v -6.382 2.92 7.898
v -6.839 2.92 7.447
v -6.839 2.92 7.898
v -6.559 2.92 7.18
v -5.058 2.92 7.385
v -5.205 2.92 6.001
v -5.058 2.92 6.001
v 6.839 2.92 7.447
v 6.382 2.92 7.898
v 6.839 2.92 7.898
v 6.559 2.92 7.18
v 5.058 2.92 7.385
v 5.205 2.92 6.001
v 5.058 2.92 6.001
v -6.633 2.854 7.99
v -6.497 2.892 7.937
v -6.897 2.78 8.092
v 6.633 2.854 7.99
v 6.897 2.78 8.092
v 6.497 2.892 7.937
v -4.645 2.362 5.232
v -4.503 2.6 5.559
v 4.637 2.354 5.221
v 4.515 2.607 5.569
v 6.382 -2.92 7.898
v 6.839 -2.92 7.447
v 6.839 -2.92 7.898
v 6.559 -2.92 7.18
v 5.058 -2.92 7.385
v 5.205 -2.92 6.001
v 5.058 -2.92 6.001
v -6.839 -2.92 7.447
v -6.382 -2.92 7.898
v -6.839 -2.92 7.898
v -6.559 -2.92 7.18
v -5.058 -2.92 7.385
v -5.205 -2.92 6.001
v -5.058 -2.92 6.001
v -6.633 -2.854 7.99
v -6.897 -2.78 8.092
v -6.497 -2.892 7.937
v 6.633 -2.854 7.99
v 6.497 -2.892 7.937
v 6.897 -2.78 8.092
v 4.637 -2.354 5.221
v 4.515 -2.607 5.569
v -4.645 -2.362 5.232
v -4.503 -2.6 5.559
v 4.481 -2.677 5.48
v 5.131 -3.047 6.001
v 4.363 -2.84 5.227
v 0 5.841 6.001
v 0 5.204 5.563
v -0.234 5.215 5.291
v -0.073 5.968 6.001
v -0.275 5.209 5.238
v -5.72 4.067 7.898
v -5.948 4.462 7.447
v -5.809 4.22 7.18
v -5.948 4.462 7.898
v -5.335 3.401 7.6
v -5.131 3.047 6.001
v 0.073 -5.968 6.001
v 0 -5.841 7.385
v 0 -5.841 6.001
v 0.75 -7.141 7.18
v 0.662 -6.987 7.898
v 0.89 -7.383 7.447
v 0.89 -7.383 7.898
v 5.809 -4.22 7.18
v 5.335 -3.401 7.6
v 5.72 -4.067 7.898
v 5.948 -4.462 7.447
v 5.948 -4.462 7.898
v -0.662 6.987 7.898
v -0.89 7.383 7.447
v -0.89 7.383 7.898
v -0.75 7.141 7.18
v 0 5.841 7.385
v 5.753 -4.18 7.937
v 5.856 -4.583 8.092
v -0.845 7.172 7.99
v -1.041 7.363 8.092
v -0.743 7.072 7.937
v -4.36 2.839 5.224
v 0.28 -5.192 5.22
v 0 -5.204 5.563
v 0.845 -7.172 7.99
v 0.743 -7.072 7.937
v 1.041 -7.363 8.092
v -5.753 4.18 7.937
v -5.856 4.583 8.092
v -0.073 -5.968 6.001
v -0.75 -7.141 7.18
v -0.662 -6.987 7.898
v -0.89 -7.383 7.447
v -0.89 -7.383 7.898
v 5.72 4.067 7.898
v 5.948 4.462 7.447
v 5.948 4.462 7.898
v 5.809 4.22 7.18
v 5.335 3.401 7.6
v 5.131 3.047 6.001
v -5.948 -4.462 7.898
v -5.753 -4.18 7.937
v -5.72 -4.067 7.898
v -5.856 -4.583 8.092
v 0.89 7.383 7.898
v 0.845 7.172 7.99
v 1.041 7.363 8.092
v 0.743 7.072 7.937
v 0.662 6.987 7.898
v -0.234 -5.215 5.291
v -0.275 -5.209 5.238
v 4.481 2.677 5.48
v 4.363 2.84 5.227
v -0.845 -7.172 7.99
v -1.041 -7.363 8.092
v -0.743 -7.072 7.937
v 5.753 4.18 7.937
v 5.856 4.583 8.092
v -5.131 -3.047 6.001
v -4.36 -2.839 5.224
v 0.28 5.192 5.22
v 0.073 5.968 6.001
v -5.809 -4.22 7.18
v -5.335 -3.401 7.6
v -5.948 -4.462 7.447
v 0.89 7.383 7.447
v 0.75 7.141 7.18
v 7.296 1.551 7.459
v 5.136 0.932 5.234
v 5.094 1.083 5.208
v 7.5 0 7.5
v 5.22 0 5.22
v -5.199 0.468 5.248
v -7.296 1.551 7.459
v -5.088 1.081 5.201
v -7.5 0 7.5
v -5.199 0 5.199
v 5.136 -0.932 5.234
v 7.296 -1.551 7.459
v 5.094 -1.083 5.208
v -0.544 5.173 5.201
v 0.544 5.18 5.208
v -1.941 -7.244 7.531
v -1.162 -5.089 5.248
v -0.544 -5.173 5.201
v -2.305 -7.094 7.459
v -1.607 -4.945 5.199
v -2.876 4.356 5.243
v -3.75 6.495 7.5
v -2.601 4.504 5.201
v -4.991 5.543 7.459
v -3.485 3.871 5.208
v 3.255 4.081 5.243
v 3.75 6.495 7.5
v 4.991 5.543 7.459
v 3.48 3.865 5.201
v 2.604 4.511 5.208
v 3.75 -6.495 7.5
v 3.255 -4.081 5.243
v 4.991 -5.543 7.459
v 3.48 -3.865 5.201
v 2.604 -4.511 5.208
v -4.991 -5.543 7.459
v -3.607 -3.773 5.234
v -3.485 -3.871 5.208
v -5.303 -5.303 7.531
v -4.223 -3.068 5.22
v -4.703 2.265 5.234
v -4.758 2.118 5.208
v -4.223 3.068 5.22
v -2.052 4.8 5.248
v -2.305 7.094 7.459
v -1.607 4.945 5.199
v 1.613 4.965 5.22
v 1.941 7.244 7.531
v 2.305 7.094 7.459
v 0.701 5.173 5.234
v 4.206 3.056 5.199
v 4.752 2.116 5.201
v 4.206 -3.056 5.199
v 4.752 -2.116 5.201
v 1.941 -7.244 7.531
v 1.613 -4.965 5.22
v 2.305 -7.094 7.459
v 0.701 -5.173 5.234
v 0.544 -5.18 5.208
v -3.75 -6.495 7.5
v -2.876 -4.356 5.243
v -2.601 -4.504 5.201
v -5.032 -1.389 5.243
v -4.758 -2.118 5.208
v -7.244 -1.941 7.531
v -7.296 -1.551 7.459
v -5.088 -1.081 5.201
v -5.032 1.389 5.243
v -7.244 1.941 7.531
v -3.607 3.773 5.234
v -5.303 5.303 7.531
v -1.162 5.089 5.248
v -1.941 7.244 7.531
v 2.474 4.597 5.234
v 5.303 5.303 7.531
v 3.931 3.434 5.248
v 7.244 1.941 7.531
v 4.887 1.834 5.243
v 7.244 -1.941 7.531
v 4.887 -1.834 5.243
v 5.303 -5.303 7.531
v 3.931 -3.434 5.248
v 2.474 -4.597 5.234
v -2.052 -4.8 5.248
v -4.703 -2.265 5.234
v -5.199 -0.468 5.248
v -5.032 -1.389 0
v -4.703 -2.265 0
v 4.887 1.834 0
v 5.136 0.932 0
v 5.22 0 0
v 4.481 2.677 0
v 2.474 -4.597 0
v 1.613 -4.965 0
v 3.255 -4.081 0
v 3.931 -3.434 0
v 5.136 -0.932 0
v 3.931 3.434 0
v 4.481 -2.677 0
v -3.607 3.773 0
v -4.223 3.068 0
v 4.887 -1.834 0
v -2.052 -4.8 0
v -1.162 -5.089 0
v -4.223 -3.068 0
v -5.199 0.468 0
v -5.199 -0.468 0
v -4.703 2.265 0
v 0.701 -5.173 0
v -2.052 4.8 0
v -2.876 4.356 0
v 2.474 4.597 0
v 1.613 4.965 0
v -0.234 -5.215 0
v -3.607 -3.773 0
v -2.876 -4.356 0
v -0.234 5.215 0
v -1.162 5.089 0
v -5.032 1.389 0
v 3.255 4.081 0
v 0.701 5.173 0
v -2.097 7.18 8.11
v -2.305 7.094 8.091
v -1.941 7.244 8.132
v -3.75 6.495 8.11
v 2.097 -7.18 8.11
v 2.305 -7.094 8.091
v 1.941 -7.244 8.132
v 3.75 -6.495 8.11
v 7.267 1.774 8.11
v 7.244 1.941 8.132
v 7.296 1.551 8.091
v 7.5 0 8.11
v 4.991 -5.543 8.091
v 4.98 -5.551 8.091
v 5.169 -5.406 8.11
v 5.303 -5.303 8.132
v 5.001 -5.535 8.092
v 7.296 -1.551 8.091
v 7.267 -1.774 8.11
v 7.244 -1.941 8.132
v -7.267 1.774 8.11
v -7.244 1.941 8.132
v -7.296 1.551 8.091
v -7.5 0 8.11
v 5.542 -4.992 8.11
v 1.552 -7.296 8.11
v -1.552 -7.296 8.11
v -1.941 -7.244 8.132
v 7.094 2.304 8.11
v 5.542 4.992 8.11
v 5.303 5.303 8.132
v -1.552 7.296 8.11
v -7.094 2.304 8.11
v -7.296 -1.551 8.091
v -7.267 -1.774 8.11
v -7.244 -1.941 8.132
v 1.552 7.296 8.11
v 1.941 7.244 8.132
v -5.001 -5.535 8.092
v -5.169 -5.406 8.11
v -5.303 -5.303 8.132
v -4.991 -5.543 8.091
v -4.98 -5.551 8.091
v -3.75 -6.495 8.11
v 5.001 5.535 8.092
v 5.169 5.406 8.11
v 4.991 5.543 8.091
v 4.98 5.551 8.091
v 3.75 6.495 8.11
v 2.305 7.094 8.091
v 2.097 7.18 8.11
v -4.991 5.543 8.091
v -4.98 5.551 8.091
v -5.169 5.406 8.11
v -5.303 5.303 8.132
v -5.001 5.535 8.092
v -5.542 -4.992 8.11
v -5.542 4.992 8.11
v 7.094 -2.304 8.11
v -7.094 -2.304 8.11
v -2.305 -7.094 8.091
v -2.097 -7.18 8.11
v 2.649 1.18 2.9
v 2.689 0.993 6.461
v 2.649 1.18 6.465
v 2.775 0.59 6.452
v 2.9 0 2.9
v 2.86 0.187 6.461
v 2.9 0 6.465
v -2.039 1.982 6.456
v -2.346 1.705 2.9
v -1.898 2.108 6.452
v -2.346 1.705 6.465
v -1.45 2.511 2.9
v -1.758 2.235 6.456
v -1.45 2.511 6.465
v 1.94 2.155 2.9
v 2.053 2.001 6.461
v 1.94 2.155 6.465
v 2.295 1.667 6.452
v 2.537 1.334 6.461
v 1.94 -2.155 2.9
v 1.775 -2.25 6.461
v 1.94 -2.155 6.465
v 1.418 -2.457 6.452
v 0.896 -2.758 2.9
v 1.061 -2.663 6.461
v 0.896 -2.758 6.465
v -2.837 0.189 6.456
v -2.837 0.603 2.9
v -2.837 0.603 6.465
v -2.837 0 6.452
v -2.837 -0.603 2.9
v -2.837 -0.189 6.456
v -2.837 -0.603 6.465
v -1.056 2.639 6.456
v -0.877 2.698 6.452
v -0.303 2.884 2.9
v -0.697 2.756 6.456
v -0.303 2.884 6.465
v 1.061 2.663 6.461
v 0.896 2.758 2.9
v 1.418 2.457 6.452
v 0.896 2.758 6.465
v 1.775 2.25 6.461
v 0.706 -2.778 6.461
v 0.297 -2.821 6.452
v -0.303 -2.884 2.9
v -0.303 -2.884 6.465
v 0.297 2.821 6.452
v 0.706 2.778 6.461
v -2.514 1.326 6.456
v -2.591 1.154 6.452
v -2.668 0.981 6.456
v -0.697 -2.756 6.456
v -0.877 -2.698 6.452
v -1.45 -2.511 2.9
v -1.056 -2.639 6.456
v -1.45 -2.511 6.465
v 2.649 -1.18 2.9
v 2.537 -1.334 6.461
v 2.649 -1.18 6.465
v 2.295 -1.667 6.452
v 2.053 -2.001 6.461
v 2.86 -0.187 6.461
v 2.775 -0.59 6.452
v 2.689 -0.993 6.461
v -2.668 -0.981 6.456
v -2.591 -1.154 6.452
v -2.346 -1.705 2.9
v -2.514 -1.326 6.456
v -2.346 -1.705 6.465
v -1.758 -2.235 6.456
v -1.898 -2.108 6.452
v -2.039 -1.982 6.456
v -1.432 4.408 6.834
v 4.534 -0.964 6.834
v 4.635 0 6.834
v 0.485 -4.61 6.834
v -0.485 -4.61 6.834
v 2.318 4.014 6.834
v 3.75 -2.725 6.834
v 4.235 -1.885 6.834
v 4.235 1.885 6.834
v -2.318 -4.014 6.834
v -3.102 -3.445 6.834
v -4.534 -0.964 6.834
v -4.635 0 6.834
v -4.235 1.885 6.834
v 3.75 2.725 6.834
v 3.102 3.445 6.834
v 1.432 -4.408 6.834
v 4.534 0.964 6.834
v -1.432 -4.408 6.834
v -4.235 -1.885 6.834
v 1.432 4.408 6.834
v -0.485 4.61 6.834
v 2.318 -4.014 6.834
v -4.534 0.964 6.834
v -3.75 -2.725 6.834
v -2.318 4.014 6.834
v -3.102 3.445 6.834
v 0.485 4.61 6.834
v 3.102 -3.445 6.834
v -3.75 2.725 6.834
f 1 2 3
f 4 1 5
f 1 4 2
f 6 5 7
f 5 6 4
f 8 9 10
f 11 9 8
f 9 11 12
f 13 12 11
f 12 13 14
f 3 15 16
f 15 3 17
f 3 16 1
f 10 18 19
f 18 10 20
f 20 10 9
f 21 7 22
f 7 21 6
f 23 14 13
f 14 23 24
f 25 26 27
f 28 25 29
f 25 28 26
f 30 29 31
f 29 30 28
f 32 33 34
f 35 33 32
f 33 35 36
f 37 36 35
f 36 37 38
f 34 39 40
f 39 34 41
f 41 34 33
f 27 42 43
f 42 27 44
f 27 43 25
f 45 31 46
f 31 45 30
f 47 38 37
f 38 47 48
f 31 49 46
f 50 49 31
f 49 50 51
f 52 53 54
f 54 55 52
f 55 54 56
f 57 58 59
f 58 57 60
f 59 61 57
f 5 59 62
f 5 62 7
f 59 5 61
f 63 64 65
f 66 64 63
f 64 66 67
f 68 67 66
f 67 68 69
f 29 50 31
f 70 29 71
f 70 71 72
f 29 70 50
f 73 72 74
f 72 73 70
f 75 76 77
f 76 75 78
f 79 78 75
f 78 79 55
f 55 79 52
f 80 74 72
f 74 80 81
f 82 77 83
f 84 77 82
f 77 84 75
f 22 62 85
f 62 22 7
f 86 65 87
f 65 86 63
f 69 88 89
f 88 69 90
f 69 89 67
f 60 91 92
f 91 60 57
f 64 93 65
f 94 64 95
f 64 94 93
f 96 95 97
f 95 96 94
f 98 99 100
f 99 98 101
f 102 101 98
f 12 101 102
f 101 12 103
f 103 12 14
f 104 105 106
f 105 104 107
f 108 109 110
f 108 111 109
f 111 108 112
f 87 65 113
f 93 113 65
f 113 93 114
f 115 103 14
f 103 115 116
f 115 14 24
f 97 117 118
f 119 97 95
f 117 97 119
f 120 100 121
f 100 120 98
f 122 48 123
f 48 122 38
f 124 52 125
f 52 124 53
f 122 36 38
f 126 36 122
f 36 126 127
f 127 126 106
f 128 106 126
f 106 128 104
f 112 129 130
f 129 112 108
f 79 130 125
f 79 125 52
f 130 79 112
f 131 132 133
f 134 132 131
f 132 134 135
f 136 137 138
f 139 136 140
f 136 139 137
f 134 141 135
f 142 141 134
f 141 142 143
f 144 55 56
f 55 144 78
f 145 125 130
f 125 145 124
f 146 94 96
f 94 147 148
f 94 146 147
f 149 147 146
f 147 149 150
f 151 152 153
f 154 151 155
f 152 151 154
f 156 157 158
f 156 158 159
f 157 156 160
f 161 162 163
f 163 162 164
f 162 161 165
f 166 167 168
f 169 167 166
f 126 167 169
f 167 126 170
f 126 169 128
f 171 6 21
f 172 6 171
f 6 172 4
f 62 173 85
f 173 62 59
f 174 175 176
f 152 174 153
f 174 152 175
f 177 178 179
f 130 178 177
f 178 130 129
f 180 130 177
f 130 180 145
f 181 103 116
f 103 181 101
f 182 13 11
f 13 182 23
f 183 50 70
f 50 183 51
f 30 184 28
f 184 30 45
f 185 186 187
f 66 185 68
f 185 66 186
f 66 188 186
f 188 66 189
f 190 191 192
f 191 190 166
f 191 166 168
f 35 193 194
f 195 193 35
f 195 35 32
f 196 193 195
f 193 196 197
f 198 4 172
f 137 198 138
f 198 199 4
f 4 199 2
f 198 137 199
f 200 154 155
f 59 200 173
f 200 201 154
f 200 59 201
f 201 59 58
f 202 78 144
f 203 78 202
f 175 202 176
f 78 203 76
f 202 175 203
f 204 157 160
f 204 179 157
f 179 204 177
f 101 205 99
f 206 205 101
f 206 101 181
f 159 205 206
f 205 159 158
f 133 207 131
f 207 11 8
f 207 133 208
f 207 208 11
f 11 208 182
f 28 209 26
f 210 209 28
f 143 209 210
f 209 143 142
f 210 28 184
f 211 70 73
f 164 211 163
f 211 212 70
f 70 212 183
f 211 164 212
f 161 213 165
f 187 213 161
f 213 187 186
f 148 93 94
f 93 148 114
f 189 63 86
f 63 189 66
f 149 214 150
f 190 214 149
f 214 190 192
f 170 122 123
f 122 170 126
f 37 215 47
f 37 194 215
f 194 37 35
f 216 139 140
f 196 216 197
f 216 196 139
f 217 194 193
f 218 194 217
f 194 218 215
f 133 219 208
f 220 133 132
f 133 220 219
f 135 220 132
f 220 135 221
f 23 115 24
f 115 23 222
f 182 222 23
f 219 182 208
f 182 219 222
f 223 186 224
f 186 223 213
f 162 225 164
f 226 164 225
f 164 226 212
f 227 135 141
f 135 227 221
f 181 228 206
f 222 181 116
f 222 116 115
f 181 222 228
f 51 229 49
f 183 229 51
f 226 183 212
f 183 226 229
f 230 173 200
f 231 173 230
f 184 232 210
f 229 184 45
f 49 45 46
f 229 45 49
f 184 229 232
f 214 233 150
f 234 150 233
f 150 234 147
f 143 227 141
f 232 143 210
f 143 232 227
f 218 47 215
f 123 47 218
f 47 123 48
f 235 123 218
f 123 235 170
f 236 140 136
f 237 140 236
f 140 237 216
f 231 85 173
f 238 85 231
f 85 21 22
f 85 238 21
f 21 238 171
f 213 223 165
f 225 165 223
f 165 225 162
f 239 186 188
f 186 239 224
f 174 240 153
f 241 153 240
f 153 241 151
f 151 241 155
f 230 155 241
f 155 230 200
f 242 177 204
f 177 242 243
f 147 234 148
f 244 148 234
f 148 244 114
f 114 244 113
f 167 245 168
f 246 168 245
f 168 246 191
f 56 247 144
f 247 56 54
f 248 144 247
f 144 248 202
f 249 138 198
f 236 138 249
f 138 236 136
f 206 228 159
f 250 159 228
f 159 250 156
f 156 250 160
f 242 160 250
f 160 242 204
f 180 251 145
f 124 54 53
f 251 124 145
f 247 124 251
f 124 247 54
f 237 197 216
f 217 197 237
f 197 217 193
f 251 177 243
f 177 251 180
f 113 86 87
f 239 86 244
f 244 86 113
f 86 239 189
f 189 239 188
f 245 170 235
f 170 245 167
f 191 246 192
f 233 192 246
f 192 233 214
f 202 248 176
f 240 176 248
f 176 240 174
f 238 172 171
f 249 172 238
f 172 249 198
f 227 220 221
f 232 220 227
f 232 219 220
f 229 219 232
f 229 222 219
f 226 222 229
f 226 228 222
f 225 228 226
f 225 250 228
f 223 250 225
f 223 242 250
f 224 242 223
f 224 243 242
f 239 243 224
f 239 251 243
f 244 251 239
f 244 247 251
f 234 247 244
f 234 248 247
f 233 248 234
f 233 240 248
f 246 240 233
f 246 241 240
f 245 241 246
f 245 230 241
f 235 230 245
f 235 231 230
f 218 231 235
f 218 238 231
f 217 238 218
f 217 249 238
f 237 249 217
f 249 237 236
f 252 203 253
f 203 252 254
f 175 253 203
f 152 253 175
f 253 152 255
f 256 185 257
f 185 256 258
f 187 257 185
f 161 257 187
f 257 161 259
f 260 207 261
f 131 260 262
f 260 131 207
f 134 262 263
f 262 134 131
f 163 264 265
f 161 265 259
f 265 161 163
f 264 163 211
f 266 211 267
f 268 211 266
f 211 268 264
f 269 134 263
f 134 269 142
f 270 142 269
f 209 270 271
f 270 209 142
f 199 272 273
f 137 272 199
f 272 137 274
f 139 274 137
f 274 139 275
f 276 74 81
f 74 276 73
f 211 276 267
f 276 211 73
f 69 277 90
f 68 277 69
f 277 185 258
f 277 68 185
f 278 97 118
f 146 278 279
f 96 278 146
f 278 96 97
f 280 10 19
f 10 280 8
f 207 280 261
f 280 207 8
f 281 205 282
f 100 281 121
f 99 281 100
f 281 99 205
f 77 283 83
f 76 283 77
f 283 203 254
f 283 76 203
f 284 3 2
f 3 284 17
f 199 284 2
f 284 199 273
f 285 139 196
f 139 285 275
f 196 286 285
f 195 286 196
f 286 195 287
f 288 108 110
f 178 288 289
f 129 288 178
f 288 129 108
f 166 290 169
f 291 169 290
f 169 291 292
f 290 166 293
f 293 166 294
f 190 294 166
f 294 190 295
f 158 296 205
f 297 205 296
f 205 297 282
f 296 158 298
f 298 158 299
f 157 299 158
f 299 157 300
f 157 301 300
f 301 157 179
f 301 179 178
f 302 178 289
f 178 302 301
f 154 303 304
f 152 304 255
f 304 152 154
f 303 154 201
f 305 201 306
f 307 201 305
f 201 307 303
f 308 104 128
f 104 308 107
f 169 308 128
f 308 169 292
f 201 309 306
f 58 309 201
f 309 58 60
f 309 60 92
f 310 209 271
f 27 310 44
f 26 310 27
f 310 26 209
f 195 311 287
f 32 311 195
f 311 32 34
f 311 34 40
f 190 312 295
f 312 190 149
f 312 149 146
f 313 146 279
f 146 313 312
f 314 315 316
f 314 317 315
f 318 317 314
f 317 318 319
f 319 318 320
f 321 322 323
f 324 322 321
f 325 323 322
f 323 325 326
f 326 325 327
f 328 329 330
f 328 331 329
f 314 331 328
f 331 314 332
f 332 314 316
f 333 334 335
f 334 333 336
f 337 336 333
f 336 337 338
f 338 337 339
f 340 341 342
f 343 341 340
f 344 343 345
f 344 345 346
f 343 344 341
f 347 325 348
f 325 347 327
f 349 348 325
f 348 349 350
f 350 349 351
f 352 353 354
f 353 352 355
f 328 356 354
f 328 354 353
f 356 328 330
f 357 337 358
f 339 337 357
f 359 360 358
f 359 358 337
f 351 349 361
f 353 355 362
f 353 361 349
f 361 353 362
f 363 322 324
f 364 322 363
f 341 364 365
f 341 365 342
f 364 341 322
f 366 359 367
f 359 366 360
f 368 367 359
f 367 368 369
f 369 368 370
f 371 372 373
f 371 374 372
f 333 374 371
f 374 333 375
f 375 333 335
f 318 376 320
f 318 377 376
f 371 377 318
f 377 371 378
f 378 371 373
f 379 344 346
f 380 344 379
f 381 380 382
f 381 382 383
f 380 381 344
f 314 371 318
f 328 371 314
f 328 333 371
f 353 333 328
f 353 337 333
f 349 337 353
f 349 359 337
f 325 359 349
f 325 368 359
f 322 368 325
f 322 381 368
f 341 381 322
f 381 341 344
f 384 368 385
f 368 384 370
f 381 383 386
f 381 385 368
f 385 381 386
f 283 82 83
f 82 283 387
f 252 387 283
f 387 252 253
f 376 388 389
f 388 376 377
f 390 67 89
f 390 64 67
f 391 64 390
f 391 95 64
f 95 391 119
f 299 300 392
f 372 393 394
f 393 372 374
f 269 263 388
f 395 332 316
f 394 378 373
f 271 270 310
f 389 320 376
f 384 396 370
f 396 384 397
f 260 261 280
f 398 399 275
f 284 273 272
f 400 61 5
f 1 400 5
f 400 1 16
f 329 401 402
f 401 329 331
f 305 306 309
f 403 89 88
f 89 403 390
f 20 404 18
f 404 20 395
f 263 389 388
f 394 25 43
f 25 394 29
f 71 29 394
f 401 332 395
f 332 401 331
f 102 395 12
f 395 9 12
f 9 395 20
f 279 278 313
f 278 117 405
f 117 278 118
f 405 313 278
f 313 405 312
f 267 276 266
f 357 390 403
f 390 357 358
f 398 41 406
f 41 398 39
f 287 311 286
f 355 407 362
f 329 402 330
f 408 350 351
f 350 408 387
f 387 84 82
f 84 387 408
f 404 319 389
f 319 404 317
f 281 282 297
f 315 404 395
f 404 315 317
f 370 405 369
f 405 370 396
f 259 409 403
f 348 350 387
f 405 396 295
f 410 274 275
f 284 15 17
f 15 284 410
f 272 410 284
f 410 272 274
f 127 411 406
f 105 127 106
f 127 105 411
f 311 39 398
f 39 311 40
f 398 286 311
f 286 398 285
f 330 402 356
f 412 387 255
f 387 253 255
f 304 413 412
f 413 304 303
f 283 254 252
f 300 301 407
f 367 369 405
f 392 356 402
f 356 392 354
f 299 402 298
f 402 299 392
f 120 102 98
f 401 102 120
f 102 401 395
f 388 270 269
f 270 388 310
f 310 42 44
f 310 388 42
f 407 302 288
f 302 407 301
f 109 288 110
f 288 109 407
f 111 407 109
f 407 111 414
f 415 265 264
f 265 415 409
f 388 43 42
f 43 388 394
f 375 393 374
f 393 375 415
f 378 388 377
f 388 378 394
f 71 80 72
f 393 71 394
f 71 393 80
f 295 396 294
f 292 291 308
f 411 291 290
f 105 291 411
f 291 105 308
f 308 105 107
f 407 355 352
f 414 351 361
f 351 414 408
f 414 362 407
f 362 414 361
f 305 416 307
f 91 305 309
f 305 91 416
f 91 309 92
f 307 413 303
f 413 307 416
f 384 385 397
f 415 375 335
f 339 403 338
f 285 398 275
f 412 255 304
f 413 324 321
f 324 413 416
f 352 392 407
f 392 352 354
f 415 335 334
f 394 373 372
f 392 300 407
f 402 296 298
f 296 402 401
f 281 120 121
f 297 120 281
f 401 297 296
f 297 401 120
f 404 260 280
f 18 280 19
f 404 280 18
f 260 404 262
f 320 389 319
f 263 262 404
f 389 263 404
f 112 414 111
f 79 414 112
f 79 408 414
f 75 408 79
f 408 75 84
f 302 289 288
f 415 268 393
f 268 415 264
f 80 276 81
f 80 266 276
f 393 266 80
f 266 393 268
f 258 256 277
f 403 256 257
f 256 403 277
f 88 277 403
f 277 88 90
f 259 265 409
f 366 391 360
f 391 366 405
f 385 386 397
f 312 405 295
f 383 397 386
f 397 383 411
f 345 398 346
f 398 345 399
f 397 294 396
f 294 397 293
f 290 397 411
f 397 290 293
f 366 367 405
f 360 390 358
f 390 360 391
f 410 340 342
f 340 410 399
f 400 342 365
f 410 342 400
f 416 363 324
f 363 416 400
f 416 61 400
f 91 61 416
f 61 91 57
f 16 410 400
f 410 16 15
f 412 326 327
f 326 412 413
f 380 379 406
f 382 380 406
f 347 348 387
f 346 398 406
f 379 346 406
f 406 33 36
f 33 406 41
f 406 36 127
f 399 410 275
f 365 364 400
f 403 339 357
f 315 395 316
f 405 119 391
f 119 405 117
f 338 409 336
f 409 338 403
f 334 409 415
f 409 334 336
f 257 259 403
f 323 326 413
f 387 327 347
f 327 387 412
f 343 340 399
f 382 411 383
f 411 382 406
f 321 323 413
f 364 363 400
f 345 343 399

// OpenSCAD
// Birthday candle holder by teejaydub

// preview[view:north, tilt:top]
/* [Global] */

// The diameter of the birthday candle [mm]
CANDLE_DIAMETER = 5.8;  //first try: 5.3, too small; 5.5 - 5.7, works but tight

// The outer diameter of the candle holder [mm]
OUTER_DIAMETER = 15;

/* [Hidden] */

CANDLE_RADIUS = CANDLE_DIAMETER / 2;
OUTER_RADIUS = OUTER_DIAMETER / 2;

HOLE_HEIGHT = CANDLE_RADIUS * 5;  // of the cutting hole object
CANDLE_HEIGHT = CANDLE_RADIUS;  // height of the candle above the floor
CANDLE_DEPTH = CANDLE_RADIUS * 1;  // how much the candle is buried in the holder

BASE_HEIGHT = CANDLE_HEIGHT + CANDLE_DEPTH;  // of the base object
BASE_RADIUS = CANDLE_RADIUS * 1.8;

PETAL_RADIUS = BASE_RADIUS / 1.7;

BOWL_RADIUS = OUTER_DIAMETER;

difference() {
	intersection() {
		union() {
			// Base
			translate([0, 0, BASE_HEIGHT / 2])
				cylinder(h = BASE_HEIGHT, r = BASE_RADIUS, center = true, $fn=35);
	
			// Flowers
			intersection() {
				union() {
					petal(0);
					petal(120);
					petal(240);
				}

				// Enforce a 45-degree angle on the petals so no support is needed.
				translate([0, 0, 50])
					cylinder(h = 100, r1 = 0, r2 = 100, center = true);
			}
		}

		// We want a circular outline.
		cylinder(h = 100, r = OUTER_RADIUS, center = true);
	}

	// Hole for the candle
	translate([0, 0, CANDLE_HEIGHT + HOLE_HEIGHT / 2])
		cylinder(h = HOLE_HEIGHT, r = CANDLE_RADIUS, center = true, $fn=15);

	// Shallow bowl
	translate([0, 0, BOWL_RADIUS + BASE_HEIGHT + 0.3])
		sphere(r = BOWL_RADIUS, center = true);
}

module petal(angle) {
	translate([0, 0, BASE_HEIGHT + PETAL_RADIUS * 0.7 - 1])
	rotate([0, 90, angle])
		cylinder(h = OUTER_DIAMETER, r = PETAL_RADIUS, center = true);
}
